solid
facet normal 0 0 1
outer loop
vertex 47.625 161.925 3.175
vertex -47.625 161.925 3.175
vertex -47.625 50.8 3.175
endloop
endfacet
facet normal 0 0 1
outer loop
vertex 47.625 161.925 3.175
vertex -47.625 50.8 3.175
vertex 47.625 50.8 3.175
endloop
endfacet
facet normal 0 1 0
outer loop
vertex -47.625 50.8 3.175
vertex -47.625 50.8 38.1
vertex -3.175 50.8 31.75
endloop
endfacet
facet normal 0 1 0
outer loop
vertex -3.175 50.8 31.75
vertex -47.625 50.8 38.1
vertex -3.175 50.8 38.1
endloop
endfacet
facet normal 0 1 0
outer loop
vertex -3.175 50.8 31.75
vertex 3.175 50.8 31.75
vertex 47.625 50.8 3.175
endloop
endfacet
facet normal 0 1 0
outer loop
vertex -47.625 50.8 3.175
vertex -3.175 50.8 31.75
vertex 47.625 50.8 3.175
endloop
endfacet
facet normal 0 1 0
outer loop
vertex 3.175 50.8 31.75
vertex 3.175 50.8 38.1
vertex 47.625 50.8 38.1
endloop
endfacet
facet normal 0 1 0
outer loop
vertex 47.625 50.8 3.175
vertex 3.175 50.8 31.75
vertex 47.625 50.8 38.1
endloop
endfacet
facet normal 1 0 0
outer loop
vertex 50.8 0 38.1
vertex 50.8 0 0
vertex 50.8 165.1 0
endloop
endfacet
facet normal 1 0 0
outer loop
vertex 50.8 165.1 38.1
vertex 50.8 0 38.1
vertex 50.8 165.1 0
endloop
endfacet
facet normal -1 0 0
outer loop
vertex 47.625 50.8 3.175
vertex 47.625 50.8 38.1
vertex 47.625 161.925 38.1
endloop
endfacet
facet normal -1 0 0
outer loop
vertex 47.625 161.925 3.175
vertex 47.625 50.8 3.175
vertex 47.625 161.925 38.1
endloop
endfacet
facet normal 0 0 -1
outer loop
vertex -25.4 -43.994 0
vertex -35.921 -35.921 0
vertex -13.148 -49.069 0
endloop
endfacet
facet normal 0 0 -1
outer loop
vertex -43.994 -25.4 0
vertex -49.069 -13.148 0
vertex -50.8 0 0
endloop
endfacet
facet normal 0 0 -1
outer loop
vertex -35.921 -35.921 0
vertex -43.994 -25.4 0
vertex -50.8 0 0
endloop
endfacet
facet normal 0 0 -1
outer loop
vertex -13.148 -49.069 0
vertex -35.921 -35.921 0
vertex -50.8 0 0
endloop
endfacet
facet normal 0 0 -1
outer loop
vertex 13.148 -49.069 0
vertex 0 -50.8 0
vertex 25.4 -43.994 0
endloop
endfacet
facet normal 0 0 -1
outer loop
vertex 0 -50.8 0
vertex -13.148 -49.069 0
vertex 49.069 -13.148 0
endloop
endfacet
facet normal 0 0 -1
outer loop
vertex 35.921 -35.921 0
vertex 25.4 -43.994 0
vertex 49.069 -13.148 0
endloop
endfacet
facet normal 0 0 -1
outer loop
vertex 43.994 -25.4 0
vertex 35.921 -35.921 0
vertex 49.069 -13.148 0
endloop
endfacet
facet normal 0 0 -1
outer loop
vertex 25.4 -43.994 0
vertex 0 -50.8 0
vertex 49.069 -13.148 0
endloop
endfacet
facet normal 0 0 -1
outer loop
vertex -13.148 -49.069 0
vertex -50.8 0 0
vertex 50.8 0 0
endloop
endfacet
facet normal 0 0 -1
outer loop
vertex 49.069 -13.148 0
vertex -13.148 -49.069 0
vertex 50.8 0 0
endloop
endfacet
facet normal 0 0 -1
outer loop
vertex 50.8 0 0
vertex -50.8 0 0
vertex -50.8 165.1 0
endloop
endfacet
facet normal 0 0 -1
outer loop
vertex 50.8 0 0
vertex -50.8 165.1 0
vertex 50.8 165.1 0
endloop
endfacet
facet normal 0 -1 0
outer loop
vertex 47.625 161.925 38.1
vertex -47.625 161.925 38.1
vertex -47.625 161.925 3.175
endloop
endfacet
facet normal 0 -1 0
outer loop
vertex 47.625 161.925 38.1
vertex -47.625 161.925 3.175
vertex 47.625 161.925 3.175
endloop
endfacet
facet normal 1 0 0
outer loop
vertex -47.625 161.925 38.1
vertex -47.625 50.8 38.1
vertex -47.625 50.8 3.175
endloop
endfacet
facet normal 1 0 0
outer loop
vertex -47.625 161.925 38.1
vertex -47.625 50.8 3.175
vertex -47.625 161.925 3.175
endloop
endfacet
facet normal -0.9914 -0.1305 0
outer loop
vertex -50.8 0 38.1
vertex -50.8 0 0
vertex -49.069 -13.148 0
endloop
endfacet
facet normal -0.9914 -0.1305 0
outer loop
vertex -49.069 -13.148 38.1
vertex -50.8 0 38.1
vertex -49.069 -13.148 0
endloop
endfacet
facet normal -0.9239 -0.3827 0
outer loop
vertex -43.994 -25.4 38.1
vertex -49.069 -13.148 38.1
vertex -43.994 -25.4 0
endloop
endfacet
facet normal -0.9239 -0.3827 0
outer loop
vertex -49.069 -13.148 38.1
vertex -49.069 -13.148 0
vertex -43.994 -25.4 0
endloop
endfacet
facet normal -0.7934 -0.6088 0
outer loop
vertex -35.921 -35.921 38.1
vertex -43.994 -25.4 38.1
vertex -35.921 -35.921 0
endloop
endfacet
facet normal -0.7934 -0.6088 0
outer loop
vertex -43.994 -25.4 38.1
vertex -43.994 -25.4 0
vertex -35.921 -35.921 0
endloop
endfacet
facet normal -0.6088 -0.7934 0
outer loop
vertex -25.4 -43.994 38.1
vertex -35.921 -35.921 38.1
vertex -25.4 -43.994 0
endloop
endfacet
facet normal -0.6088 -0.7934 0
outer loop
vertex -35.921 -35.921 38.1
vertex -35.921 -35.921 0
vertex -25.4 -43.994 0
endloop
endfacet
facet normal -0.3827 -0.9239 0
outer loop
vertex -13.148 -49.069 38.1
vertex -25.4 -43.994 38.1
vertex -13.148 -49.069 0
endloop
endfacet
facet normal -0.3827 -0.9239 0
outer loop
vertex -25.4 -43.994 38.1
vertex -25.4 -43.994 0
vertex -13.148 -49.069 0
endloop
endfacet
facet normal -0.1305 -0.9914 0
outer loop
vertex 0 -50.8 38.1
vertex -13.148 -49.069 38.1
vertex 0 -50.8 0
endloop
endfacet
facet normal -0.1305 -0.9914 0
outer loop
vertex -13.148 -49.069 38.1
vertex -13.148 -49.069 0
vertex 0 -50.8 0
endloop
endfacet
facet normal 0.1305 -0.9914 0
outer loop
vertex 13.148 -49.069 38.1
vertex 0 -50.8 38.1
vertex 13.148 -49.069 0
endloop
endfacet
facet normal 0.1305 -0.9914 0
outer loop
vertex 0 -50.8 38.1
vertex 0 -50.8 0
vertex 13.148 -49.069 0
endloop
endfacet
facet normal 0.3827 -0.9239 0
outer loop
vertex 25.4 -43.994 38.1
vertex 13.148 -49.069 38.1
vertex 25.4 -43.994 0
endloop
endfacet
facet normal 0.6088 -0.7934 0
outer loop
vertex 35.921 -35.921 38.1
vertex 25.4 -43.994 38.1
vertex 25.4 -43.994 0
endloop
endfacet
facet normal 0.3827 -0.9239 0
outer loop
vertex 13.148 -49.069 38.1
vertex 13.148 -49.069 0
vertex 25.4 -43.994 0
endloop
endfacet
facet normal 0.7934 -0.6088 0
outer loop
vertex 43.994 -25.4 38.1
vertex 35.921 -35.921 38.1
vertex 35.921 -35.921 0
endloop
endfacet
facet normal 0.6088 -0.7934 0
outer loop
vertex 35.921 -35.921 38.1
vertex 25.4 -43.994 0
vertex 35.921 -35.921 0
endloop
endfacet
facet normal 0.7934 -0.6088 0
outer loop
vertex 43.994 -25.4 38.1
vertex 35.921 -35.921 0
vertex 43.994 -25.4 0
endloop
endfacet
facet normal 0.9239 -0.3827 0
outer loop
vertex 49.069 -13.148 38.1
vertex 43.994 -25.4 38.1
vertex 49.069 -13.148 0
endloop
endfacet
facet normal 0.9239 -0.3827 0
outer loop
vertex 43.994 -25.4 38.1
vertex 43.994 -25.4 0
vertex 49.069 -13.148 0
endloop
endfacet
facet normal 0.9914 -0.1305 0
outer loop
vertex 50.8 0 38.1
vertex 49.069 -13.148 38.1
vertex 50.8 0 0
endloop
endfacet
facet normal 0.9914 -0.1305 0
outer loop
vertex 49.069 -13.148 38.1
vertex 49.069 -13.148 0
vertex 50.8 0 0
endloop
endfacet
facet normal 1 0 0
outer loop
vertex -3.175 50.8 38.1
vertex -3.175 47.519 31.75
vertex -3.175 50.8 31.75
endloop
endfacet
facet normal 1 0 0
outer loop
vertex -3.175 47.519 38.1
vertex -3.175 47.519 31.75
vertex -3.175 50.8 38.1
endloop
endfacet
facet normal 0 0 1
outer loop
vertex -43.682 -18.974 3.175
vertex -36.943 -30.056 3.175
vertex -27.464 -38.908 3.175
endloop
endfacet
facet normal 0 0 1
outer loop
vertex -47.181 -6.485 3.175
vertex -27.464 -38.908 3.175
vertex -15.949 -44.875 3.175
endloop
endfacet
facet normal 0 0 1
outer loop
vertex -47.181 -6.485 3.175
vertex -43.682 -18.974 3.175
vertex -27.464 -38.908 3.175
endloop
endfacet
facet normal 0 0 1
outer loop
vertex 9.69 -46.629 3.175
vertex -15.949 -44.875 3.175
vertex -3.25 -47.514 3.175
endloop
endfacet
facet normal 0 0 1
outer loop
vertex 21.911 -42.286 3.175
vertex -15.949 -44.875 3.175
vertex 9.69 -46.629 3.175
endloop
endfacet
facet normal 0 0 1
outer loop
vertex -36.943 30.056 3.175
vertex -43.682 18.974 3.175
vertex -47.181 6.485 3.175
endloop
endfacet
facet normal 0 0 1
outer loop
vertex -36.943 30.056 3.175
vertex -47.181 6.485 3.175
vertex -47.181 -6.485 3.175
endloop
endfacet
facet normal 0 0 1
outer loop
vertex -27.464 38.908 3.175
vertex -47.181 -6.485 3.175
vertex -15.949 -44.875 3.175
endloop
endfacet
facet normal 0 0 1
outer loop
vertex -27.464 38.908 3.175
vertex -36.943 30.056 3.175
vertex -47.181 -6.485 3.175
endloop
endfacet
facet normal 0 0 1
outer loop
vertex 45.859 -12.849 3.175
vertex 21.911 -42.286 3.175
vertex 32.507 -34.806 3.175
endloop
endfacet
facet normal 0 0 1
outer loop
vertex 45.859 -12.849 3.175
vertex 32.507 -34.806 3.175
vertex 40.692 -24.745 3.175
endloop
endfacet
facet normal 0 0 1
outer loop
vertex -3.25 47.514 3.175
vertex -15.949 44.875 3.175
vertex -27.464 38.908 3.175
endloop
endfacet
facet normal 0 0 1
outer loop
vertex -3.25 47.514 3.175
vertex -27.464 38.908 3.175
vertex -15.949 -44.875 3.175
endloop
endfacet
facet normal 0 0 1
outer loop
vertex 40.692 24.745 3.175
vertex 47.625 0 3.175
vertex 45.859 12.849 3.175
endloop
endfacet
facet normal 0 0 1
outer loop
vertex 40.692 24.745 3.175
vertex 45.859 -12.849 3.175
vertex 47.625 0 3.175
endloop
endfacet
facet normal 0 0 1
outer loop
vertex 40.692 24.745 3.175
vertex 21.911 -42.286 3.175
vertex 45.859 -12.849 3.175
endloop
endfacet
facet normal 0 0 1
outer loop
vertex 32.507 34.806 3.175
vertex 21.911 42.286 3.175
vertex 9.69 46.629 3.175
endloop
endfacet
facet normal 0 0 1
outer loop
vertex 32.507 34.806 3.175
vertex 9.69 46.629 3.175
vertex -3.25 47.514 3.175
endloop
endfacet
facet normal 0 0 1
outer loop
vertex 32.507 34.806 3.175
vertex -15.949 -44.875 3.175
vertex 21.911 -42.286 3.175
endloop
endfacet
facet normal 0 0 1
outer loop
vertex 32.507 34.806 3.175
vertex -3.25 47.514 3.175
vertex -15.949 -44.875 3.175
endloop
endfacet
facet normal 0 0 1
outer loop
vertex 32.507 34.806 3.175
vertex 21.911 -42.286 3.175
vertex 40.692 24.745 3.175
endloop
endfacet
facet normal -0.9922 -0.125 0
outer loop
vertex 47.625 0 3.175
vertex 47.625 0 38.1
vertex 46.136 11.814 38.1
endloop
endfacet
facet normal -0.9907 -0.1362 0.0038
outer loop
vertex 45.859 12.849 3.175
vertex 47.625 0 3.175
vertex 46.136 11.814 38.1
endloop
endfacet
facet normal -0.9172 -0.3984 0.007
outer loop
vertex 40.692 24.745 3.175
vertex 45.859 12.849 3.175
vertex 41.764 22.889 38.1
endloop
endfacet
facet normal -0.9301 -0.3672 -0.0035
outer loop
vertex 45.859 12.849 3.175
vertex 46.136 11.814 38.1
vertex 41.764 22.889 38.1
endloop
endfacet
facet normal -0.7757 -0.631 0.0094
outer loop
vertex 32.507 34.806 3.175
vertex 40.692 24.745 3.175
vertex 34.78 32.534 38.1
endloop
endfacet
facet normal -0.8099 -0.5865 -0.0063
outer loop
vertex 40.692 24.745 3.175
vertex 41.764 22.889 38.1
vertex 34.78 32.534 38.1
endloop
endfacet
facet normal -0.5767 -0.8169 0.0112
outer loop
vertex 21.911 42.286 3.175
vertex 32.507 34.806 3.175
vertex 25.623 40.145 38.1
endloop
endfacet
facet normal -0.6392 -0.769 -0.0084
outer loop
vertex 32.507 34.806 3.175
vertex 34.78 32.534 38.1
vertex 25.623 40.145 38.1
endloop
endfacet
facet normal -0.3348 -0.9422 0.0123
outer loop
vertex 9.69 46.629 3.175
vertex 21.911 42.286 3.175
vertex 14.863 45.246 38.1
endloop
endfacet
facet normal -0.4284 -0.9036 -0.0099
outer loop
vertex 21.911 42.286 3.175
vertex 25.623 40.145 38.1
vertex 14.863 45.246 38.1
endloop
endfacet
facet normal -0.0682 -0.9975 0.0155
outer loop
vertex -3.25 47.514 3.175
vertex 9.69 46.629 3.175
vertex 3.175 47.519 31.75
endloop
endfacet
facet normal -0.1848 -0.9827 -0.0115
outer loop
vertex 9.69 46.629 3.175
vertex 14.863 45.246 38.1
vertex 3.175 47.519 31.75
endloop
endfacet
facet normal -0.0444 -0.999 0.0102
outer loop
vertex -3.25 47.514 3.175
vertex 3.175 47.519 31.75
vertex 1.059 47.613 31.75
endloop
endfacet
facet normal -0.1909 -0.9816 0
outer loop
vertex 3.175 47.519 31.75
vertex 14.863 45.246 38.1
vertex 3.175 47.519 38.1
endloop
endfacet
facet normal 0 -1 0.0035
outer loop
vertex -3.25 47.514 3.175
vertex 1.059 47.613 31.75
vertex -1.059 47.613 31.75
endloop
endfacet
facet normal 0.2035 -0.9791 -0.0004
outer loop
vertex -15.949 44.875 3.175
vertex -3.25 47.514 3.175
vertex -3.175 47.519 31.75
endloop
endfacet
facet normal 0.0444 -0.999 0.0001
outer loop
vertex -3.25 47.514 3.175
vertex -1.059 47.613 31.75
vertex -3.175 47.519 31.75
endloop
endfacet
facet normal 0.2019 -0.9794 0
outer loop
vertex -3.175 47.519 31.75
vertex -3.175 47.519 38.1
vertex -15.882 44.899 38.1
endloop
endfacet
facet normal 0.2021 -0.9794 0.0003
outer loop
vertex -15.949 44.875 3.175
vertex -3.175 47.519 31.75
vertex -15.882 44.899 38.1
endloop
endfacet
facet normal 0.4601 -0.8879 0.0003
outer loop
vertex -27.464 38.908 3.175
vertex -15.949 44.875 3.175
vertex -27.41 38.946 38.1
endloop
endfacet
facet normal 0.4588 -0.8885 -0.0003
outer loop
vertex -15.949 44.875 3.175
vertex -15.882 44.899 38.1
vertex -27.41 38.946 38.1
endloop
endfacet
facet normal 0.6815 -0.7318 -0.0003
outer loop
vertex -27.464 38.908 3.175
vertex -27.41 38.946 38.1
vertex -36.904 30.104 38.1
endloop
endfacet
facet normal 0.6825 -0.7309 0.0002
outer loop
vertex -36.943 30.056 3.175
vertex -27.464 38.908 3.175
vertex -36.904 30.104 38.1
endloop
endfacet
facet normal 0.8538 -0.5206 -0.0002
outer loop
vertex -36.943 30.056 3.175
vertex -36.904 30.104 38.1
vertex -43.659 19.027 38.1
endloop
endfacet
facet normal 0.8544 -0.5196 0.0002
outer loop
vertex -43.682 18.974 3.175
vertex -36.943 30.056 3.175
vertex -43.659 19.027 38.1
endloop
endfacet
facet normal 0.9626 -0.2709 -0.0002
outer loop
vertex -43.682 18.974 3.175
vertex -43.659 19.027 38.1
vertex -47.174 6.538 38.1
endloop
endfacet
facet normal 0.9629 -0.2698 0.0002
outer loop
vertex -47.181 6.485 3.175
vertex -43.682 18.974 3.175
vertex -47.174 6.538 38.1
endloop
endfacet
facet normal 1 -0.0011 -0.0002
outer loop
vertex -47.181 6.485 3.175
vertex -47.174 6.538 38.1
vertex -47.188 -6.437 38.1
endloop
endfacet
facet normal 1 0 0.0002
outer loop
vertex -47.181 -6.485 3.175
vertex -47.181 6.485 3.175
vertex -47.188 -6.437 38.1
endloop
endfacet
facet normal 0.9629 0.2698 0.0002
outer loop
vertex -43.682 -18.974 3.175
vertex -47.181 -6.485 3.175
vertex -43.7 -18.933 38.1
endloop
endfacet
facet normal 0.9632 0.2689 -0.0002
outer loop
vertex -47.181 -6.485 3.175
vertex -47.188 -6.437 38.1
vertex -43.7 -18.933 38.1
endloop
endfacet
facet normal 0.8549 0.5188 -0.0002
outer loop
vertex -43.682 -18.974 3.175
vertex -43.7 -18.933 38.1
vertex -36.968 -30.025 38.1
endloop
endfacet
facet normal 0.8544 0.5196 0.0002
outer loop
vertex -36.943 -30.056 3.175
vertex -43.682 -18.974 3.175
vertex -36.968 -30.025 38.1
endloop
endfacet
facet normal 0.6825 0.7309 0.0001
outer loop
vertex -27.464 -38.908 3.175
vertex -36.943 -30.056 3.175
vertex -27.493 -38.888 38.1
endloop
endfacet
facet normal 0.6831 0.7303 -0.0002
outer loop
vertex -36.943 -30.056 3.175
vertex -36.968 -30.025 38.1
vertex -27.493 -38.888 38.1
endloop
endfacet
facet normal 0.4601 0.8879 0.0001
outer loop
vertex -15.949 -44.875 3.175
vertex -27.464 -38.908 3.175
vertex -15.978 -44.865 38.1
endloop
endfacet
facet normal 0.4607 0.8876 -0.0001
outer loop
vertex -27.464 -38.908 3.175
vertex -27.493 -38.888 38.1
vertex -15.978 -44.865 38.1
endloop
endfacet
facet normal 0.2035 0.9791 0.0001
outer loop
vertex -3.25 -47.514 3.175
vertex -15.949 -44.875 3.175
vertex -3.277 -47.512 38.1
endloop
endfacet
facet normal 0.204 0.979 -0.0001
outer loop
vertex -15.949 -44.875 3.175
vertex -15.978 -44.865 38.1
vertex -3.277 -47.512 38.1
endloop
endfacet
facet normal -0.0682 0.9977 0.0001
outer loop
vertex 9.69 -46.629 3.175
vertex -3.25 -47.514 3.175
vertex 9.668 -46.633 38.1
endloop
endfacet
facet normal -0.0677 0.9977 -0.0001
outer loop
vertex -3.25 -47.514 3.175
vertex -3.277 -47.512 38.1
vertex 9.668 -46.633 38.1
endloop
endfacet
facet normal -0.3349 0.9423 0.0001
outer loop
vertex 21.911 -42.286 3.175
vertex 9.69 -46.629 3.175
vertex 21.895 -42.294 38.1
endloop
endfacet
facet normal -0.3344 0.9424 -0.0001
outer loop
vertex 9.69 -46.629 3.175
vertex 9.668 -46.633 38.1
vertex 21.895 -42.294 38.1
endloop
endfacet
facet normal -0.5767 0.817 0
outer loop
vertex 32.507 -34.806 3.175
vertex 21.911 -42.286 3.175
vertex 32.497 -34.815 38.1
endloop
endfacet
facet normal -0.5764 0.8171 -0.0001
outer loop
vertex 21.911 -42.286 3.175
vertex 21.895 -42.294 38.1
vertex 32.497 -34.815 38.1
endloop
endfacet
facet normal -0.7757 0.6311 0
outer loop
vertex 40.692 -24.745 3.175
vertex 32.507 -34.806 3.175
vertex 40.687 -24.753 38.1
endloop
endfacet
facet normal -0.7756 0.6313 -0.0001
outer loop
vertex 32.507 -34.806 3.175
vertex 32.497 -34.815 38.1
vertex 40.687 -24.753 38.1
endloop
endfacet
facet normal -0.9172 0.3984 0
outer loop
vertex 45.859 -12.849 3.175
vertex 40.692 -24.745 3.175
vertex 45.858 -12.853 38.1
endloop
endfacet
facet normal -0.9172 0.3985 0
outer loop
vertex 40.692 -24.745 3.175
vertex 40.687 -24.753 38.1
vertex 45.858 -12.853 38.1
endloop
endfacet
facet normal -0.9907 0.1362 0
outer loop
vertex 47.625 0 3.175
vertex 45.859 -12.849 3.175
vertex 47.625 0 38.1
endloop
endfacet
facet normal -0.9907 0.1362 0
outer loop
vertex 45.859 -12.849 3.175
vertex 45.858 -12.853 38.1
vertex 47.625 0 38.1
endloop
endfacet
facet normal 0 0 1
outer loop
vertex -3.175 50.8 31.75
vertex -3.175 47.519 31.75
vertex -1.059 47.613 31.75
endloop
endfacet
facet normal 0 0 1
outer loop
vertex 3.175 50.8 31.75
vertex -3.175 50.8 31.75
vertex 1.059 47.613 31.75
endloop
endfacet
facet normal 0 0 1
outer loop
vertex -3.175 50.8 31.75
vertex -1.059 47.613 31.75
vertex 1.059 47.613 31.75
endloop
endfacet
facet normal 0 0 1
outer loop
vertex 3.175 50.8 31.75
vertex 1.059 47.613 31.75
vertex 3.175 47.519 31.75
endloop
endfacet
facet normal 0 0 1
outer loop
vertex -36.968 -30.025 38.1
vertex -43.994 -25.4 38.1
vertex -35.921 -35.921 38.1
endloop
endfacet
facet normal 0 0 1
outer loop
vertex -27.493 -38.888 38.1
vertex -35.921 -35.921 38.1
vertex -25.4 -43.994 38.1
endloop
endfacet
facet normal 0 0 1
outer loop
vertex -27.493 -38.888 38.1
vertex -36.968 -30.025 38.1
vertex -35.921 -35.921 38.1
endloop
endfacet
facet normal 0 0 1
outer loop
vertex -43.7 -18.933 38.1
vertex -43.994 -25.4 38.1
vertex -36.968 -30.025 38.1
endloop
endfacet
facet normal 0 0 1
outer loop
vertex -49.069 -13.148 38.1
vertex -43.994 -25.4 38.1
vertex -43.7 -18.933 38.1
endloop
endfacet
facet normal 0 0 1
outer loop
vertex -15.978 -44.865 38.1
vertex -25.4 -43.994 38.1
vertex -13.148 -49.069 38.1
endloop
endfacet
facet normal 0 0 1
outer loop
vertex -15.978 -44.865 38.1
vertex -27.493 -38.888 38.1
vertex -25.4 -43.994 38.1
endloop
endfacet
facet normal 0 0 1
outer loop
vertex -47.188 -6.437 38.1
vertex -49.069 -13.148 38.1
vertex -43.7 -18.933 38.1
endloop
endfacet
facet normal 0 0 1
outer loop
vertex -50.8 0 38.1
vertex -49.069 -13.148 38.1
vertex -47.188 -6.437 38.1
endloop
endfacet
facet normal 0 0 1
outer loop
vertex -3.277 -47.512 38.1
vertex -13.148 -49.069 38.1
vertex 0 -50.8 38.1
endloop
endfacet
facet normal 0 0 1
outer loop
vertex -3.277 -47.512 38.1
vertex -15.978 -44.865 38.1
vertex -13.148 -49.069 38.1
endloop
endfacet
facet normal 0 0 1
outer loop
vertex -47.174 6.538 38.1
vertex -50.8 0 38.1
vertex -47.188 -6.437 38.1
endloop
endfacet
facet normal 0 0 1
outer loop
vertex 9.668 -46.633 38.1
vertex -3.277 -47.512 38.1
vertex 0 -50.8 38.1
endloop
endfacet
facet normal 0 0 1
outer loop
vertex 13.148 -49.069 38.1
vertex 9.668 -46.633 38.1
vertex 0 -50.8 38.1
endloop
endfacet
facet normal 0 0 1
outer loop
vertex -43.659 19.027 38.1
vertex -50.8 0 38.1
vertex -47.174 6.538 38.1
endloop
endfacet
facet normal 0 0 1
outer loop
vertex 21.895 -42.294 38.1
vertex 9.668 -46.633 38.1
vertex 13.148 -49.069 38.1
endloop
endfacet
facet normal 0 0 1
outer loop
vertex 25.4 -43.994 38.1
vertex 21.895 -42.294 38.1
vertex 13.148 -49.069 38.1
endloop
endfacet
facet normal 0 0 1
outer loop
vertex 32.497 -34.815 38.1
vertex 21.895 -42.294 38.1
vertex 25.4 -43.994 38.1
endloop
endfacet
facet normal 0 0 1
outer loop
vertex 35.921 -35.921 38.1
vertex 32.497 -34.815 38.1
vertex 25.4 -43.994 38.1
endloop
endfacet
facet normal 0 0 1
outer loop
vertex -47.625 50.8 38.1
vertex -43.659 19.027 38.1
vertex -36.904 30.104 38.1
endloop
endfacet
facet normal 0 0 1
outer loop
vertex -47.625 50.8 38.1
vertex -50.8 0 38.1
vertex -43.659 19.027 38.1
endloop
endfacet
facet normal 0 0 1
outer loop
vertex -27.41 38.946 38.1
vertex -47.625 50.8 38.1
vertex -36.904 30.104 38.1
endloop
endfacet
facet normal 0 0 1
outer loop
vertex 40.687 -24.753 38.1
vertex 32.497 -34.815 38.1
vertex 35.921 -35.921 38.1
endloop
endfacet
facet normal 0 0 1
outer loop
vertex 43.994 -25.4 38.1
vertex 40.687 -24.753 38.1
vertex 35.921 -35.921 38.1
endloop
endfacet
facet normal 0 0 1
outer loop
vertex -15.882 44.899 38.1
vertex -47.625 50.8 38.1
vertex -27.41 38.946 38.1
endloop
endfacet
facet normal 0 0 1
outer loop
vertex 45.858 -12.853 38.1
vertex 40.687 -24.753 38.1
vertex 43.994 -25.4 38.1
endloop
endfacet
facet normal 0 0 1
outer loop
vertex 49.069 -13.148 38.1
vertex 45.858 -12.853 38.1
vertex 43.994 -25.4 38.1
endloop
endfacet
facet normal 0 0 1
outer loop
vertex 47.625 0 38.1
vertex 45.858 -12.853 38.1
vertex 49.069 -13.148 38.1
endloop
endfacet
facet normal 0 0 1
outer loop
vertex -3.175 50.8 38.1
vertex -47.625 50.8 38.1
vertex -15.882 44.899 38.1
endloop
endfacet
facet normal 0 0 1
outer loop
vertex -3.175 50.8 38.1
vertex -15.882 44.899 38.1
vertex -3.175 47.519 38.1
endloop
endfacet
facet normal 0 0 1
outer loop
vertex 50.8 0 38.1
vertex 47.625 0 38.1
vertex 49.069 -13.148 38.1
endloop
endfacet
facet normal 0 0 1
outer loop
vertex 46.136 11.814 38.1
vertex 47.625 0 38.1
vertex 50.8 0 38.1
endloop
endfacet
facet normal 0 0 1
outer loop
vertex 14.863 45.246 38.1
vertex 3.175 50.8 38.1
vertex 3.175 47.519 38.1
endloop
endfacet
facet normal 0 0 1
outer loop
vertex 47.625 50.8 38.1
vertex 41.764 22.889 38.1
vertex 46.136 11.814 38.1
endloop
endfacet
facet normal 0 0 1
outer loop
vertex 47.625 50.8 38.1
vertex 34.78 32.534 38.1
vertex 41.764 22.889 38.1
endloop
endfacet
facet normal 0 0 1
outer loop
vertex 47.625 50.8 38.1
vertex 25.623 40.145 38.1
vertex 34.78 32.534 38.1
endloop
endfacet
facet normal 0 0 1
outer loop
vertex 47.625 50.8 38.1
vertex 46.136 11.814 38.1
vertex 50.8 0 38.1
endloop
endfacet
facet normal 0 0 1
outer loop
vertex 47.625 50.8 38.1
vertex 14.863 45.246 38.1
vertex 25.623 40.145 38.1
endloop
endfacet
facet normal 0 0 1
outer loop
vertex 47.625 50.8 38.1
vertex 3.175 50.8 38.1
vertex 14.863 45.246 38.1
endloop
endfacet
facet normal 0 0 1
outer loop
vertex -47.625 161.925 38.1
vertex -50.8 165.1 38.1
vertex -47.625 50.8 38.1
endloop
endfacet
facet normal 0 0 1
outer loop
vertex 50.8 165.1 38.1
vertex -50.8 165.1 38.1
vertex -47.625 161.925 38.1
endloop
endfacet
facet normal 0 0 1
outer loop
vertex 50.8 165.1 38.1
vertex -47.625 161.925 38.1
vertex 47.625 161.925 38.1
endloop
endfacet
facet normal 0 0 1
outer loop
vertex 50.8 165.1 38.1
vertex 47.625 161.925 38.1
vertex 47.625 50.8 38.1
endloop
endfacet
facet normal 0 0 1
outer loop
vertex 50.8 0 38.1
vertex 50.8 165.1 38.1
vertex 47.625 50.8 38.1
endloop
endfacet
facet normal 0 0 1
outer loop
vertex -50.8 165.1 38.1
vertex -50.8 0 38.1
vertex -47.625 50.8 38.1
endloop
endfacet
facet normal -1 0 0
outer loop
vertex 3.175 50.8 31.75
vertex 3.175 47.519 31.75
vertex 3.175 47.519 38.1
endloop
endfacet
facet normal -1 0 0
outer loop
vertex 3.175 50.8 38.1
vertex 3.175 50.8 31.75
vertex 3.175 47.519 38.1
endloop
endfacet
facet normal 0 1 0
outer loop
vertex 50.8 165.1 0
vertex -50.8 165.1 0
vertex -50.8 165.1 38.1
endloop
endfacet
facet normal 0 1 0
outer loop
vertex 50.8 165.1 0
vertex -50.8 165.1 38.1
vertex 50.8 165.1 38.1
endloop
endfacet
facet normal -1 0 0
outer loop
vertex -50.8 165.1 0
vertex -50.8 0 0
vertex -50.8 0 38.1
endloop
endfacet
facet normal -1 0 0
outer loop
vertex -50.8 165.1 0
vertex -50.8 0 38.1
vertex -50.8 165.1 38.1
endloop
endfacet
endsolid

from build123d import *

# Parameters (mm, degrees)
F0_W     = 101.6
F0_H     = 165.1
F1_DEPTH = 38.1
F2_R     = 47.625
F3_DEPTH = 34.925
F4_W     = 6.35
F4_H     = 6.35
F5_DEPTH = 50.8
F6_W     = 95.25
F6_H     = 111.125
F7_DEPTH = 34.925


with BuildPart() as f1:
    # F0 (on Top) → F1 (new body)
    with BuildSketch(Plane.XY):
        with BuildLine():
            Line((50.8, 0), (-50.8, 0))
            ThreePointArc((-50.8, 0), (0, -50.8), (50.8, 0))
        make_face()
        with Locations((0, 82.55)):
            Rectangle(F0_W, F0_H)
    extrude(amount=F1_DEPTH)

    # F2 (on face) → F3 (cut)
    with BuildSketch(Plane.XY.offset(38.1)):
        Circle(F2_R)
    extrude(amount=-F3_DEPTH, mode=Mode.SUBTRACT)

    # F4 (on Front) → F5 (cut)
    with BuildSketch(Plane.XZ):
        with Locations((0, 34.925)):
            Rectangle(F4_W, F4_H)
    extrude(amount=-F5_DEPTH, mode=Mode.SUBTRACT)

    # F6 (on face) → F7 (cut)
    with BuildSketch(Plane.XY.offset(38.1)):
        with Locations((0, 106.3625)):
            Rectangle(F6_W, F6_H)
    extrude(amount=-F7_DEPTH, mode=Mode.SUBTRACT)


solid = f1.part
